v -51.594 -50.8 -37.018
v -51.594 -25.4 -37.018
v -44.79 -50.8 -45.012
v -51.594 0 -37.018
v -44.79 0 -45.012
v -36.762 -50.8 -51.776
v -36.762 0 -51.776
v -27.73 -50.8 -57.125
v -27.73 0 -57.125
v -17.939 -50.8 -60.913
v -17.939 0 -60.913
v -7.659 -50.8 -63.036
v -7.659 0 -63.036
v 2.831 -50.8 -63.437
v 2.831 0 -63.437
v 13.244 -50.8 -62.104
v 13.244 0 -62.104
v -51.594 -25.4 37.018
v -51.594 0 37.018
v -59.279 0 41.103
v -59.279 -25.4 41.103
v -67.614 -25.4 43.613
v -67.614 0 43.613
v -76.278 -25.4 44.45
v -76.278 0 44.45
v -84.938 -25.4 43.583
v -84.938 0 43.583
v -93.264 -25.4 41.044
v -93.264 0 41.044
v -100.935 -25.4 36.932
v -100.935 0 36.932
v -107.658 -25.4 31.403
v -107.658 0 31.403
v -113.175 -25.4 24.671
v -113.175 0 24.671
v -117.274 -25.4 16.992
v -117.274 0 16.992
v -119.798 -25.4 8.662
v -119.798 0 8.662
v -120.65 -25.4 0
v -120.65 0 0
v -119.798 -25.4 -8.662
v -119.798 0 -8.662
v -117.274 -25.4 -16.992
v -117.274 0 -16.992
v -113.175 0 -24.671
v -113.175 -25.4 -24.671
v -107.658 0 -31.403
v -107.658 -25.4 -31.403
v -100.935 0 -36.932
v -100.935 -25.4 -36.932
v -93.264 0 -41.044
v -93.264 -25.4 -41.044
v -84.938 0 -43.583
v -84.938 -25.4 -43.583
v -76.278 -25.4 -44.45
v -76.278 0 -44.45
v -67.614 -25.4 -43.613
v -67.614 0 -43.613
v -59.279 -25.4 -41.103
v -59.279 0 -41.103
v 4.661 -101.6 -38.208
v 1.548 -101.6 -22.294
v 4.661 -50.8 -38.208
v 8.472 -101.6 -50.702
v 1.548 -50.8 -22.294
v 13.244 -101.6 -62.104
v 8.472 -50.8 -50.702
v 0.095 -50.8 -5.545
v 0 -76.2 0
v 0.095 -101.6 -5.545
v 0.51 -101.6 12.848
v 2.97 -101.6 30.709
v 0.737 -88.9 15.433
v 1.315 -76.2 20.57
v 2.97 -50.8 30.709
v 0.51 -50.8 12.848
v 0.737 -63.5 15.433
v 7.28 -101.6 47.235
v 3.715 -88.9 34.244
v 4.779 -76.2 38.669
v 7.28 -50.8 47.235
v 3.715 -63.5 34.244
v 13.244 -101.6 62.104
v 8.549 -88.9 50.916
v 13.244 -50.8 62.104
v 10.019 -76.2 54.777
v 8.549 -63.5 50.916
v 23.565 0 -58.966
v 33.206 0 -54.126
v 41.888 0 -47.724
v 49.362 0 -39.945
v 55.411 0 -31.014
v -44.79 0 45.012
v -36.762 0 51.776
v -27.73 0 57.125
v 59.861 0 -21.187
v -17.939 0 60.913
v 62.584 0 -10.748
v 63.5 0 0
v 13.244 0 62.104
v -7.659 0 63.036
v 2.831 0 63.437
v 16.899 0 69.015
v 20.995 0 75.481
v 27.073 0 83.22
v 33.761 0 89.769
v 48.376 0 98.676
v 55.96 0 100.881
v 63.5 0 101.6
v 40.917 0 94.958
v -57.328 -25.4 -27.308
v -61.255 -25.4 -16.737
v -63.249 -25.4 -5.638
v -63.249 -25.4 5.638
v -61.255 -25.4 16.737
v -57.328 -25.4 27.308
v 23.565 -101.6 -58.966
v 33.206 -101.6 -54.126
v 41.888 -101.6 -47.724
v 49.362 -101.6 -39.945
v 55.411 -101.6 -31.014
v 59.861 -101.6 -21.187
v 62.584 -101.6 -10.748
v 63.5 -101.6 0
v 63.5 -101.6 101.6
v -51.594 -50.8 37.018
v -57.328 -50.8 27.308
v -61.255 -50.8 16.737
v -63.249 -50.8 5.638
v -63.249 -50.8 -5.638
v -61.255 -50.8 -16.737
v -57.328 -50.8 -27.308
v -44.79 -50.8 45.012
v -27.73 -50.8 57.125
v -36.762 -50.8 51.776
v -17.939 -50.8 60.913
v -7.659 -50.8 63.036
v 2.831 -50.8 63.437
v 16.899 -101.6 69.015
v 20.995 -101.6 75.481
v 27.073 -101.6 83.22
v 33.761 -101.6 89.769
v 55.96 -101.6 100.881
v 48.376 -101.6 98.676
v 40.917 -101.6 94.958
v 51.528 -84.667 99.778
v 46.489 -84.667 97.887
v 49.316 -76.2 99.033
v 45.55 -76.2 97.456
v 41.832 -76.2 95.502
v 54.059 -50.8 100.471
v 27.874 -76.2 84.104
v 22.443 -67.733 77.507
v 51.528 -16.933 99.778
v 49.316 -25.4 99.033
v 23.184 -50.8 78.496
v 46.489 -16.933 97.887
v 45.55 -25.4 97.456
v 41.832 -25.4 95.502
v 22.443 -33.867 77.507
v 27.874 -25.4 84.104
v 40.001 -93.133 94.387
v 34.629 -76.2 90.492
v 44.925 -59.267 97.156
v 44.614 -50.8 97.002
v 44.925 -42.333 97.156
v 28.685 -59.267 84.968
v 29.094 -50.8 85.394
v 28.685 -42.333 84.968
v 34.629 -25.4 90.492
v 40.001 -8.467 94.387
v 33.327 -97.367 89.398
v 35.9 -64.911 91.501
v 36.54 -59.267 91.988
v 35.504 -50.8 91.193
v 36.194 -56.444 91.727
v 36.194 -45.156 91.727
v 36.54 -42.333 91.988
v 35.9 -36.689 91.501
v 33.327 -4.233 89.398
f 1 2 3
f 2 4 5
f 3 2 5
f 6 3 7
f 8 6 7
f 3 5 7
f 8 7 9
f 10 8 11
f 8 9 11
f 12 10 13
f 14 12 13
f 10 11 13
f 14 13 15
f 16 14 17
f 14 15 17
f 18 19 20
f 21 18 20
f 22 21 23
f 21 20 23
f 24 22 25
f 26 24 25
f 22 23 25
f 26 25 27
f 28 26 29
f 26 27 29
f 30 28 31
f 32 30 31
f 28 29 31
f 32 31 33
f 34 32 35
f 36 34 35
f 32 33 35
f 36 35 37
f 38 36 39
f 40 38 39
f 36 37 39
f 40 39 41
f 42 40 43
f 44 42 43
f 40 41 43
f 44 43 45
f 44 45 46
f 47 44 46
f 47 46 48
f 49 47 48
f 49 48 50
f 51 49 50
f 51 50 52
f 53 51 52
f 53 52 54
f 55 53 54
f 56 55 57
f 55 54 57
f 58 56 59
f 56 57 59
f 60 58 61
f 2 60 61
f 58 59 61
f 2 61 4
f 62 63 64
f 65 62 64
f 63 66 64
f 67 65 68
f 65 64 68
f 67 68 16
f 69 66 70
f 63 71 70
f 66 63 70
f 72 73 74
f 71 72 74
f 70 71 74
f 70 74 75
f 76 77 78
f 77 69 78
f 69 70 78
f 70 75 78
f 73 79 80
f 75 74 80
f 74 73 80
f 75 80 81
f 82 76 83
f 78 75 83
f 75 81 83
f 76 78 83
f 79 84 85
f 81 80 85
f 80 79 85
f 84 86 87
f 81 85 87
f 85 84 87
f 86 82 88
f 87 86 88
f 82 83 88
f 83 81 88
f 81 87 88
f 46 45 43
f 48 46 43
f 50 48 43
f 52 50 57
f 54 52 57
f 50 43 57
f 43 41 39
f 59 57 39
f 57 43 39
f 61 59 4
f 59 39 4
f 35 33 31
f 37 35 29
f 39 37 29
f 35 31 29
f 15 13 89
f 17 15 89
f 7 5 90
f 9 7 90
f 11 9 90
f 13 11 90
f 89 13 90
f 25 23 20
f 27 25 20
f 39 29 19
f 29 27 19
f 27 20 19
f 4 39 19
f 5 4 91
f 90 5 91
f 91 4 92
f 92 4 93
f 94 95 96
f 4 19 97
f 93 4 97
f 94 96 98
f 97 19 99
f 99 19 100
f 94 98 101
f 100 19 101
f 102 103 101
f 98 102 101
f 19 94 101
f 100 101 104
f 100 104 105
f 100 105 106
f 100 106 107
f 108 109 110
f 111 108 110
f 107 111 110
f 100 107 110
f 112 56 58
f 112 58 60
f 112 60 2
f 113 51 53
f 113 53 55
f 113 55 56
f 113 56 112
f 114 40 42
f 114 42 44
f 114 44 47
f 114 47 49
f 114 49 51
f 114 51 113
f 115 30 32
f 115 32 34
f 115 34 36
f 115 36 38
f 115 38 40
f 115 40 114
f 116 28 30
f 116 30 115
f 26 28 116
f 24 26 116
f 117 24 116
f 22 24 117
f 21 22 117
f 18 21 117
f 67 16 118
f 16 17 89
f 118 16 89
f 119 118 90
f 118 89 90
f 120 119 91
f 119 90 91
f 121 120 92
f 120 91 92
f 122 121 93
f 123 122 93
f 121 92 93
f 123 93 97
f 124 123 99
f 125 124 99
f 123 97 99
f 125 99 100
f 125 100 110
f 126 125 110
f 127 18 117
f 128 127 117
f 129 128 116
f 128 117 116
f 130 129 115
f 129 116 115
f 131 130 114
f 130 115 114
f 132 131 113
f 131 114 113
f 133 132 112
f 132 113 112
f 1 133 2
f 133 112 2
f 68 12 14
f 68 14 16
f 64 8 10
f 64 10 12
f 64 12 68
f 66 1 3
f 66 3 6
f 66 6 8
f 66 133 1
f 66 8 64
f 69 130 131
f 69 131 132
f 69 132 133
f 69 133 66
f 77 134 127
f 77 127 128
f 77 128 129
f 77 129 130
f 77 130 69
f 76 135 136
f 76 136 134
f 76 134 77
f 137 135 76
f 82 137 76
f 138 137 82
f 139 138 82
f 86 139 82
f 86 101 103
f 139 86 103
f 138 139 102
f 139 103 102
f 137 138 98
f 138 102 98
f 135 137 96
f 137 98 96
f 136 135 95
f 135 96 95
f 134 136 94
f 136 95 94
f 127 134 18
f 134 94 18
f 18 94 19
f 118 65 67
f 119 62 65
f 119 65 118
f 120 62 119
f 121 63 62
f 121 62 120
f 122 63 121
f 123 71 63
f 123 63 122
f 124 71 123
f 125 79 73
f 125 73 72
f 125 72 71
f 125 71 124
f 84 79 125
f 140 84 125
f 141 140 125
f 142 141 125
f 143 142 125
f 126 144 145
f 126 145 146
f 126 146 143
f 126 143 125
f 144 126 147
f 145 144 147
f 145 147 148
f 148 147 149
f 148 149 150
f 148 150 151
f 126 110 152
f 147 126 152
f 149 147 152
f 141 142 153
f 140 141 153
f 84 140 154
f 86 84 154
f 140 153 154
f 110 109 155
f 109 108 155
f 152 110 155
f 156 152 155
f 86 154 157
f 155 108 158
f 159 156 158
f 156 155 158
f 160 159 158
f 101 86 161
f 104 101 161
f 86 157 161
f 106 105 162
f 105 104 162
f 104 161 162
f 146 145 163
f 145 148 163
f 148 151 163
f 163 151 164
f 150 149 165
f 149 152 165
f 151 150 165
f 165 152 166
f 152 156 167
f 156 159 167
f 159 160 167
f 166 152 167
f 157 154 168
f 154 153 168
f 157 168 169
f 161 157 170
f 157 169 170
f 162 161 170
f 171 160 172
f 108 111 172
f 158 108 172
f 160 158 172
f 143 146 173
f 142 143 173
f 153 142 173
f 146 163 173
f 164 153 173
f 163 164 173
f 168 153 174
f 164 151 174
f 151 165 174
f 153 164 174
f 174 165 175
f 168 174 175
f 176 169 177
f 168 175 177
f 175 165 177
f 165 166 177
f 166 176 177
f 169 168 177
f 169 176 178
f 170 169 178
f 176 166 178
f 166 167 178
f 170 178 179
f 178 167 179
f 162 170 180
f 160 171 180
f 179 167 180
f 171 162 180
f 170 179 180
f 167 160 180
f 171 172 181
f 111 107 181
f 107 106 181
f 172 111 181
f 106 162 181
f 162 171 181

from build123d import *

# Parameters (mm, degrees)
F1_DEPTH = 101.6
F2_DEPTH = 50.8
F3_DEPTH = 25.4


with BuildPart() as f1:
    # F0 (on Front) → F1 (new body)
    with BuildSketch(Plane.XZ):
        with BuildLine():
            add(Edge.make_bspline(
                [(63.5, 101.6), (32.3093875408, 101.6), (13.2439655959, 62.1035214404)],
                knots=[3.1415926536, 3.1415926536, 3.1415926536, 4.0547434617, 4.0547434617, 4.0547434617], degree=2, weights=[1, 0.8975675831, 1]))
            ThreePointArc((13.2439655959, 62.1035214404), (49.3621404284, 39.9453262889), (63.5, 0))
            Line((63.5, 0), (63.5, 101.6))
        make_face()
        with BuildLine():
            ThreePointArc((63.5, 0), (49.3621404284, 39.9453262889), (13.2439655959, 62.1035214404))
            add(Edge.make_bspline(
                [(13.2439655959, 62.1035214404), (0, 34.6669399309), (0, 0)],
                knots=[4.0547434617, 4.0547434617, 4.0547434617, 4.7123889804, 4.7123889804, 4.7123889804], degree=2, weights=[1, 0.9464231645, 1]))
            add(Edge.make_bspline(
                [(0, 0), (0, -34.6669399309), (13.2439655959, -62.1035214404)],
                knots=[4.7123889804, 4.7123889804, 4.7123889804, 5.370034499, 5.370034499, 5.370034499], degree=2, weights=[1, 0.9464231645, 1]))
            ThreePointArc((13.2439655959, -62.1035214404), (49.3621404284, -39.9453262889), (63.5, 0))
        make_face()
    extrude(amount=F1_DEPTH)

    # F0 (on Front) → F2 (join)
    with BuildSketch(Plane.XZ):
        with BuildLine():
            ThreePointArc((-51.59375, 37.0180356169), (-37.0237934934, 21.0006510316), (-31.75, 0))
            ThreePointArc((-31.75, 0), (-37.0237934934, -21.0006510316), (-51.59375, -37.0180356169))
            ThreePointArc((-51.59375, -37.0180356169), (-22.9128106244, -59.2220660674), (13.2439655959, -62.1035214404))
            add(Edge.make_bspline(
                [(0, 0), (0, -34.6669399309), (13.2439655959, -62.1035214404)],
                knots=[4.7123889804, 4.7123889804, 4.7123889804, 5.370034499, 5.370034499, 5.370034499], degree=2, weights=[1, 0.9464231645, 1]))
            add(Edge.make_bspline(
                [(13.2439655959, 62.1035214404), (0, 34.6669399309), (0, 0)],
                knots=[4.0547434617, 4.0547434617, 4.0547434617, 4.7123889804, 4.7123889804, 4.7123889804], degree=2, weights=[1, 0.9464231645, 1]))
            ThreePointArc((13.2439655959, 62.1035214404), (-22.9128106244, 59.2220660674), (-51.59375, 37.0180356169))
        make_face()
        with BuildLine():
            ThreePointArc((-51.59375, -37.0180356169), (-37.0237934934, -21.0006510316), (-31.75, 0))
            ThreePointArc((-31.75, 0), (-37.0237934934, 21.0006510316), (-51.59375, 37.0180356169))
            ThreePointArc((-51.59375, 37.0180356169), (-63.5, 0), (-51.59375, -37.0180356169))
        make_face()
    extrude(amount=F2_DEPTH)

    # F0 (on Front) → F3 (join)
    with BuildSketch(Plane.XZ):
        with BuildLine():
            ThreePointArc((-51.59375, -37.0180356169), (-63.5, 0), (-51.59375, 37.0180356169))
            ThreePointArc((-51.59375, 37.0180356169), (-120.65, 0), (-51.59375, -37.0180356169))
        make_face()
    extrude(amount=F3_DEPTH)


solid = f1.part
